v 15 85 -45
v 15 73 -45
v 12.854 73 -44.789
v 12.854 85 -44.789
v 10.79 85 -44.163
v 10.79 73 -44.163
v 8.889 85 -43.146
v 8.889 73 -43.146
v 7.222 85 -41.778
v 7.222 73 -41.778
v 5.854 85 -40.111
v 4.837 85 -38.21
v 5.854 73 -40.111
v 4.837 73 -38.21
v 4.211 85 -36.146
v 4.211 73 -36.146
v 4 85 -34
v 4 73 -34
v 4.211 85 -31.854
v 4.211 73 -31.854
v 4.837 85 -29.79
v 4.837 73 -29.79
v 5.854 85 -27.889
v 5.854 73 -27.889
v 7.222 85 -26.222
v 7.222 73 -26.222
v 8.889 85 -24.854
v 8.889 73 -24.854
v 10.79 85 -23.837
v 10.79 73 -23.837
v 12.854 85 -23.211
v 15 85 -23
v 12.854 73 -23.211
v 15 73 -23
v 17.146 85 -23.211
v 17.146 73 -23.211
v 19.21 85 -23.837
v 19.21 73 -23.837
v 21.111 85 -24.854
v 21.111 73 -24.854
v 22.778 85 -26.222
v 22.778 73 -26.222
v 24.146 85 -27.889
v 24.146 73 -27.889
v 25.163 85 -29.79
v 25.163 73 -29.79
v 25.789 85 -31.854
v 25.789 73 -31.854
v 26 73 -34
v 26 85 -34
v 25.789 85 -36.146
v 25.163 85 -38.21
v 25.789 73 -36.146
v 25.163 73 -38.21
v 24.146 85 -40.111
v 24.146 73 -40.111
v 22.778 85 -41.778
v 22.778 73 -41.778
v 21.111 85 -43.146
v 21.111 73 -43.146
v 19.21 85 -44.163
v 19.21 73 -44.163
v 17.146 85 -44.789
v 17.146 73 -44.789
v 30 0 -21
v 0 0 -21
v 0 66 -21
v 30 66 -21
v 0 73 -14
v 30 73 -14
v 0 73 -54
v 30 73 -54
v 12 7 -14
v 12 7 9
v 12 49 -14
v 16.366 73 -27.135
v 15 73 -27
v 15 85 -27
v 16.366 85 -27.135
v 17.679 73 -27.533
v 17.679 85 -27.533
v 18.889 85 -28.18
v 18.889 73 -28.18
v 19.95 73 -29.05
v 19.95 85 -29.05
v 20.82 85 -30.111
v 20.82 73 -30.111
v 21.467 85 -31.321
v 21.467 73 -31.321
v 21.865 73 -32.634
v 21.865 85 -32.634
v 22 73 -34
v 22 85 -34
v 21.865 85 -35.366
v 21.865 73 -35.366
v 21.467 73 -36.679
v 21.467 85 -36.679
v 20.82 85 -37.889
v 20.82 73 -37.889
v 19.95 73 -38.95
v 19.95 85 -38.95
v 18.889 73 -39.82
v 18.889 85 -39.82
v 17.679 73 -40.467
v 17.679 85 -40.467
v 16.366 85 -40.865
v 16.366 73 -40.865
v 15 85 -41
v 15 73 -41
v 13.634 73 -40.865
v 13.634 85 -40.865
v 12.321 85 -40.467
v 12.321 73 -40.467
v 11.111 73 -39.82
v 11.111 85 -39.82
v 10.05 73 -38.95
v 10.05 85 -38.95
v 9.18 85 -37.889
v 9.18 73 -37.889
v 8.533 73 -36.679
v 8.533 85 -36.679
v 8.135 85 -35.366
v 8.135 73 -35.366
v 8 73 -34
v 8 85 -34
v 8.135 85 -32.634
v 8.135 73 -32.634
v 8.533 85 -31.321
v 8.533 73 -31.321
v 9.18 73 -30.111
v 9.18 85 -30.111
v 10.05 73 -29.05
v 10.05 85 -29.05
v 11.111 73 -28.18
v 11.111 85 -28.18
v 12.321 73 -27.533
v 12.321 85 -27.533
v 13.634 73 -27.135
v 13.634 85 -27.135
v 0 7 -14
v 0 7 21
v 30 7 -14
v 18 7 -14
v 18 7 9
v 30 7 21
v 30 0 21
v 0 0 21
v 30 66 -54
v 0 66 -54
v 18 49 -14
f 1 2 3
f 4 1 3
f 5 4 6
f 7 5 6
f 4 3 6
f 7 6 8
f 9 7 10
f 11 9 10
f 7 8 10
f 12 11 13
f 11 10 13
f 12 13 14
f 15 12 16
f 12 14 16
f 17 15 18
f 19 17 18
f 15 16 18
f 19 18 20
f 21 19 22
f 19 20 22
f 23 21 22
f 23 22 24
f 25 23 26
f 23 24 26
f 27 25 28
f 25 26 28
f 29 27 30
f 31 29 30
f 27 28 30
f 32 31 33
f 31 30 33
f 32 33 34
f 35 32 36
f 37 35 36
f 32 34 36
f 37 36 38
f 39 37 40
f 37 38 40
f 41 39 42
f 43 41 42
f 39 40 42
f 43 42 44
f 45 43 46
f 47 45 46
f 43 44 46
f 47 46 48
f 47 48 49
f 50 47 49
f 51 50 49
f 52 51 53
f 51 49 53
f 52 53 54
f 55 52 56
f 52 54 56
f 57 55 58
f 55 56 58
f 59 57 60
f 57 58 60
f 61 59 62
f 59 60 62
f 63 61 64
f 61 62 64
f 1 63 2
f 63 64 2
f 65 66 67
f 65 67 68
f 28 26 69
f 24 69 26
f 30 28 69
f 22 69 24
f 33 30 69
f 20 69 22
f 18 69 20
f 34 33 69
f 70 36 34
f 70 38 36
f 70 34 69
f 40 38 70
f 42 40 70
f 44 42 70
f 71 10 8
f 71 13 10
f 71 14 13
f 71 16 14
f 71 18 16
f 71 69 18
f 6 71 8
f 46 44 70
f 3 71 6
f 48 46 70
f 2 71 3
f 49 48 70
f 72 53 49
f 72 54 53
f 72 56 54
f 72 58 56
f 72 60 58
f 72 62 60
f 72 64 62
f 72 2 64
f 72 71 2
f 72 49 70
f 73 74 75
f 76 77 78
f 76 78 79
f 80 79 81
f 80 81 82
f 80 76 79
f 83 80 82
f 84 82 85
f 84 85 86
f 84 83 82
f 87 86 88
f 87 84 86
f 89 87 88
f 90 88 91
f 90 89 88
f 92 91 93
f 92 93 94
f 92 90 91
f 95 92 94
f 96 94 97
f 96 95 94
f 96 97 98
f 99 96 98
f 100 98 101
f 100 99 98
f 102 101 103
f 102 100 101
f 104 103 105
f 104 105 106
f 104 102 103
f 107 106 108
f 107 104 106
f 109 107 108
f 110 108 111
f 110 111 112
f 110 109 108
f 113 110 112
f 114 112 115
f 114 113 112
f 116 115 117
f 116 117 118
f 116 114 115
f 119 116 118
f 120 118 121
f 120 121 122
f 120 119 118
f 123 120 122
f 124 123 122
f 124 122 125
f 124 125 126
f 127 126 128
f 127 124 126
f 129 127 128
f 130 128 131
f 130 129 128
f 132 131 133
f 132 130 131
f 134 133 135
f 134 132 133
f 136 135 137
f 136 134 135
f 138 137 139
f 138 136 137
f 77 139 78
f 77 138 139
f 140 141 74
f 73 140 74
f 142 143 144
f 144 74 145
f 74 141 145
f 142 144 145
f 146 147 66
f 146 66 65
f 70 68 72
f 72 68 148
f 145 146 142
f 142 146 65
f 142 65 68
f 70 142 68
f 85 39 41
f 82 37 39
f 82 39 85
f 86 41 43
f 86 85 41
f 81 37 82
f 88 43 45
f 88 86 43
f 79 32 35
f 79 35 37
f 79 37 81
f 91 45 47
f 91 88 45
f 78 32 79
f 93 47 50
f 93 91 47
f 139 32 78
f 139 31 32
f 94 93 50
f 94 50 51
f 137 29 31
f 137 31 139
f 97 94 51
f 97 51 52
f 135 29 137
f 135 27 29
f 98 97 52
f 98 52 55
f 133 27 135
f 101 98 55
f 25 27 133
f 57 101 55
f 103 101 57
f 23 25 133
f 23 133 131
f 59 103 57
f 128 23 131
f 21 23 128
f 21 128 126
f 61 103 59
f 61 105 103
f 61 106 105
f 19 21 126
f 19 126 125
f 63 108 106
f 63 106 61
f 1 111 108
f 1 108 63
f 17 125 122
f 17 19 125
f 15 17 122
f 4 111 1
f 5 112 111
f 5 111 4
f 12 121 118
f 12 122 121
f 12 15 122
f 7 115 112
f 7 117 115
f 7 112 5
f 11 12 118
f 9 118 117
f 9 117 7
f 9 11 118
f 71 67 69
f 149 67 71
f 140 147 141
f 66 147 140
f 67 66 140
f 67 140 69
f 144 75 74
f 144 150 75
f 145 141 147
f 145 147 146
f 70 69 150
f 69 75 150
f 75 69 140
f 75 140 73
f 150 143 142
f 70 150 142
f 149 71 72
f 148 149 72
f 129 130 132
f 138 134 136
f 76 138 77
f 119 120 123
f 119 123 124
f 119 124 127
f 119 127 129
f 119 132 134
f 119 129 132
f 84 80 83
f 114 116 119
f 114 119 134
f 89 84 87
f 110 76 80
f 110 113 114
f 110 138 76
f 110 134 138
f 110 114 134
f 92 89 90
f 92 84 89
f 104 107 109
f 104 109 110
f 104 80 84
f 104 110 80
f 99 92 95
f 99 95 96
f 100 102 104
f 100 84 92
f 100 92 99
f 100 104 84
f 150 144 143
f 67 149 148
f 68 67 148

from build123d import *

# Parameters (mm, degrees)
SKETCH1_W           = 30
SKETCH1_H           = 66
BOSS_EXTRUDE1_DEPTH = 21
SKETCH2_W           = 30
SKETCH2_H           = 59
CUT_EXTRUDE1_DEPTH  = 84.785440263
SKETCH4_W           = 30
SKETCH4_H           = 7
BOSS_EXTRUDE2_DEPTH = 66
SKETCH9_W           = 30
SKETCH9_H           = 7
BOSS_EXTRUDE3_DEPTH = 40
SKETCH10_R          = 11
SKETCH10_R_2        = 7
BOSS_EXTRUDE4_DEPTH = 12
BOSS_EXTRUDE6_DEPTH = 3


with BuildPart() as part:
    # Sketch1 → Boss-Extrude1 (new, symmetric)
    with BuildSketch(Plane.XY):
        with Locations((15, 33)):
            Rectangle(SKETCH1_W, SKETCH1_H)
    extrude(amount=BOSS_EXTRUDE1_DEPTH, both=True)

    # Sketch2 → Cut-Extrude1 (cut, through all)
    with BuildSketch(Plane.XY.offset(21)):
        with Locations((15, 36.5)):
            Rectangle(SKETCH2_W, SKETCH2_H)
    extrude(amount=-CUT_EXTRUDE1_DEPTH, mode=Mode.SUBTRACT)

    # Sketch4 → Boss-Extrude2 (add)
    with BuildSketch(Plane(origin=(0, 7, 0), x_dir=(1, 0, 0), z_dir=(0, 1, 0))):
        with Locations((15, 17.5)):
            Rectangle(SKETCH4_W, SKETCH4_H)
    extrude(amount=BOSS_EXTRUDE2_DEPTH)

    # Sketch9 → Boss-Extrude3 (add)
    with BuildSketch(Plane.XY.offset(-14)):
        with Locations((15, 69.5)):
            Rectangle(SKETCH9_W, SKETCH9_H)
    extrude(amount=-BOSS_EXTRUDE3_DEPTH)

    # Sketch10 → Boss-Extrude4 (add)
    with BuildSketch(Plane(origin=(0, 73, 0), x_dir=(1, 0, 0), z_dir=(0, 1, 0))):
        with Locations(Location((15, 34, 0), (0, 0, 90))):
            Circle(SKETCH10_R)
        with Locations(Location((15, 34, 0), (0, 0, 270))):
            Circle(SKETCH10_R_2, mode=Mode.SUBTRACT)
    extrude(amount=BOSS_EXTRUDE4_DEPTH)

    # Sketch18 → Boss-Extrude6 (add, symmetric)
    with BuildSketch(Plane(origin=(15, 0, 0), x_dir=(0, 0, -1), z_dir=(1, 0, 0))):
        Polygon((14, 49), (-9, 7), (14, 7), align=None)
    extrude(amount=BOSS_EXTRUDE6_DEPTH, both=True)


solid = part.part
